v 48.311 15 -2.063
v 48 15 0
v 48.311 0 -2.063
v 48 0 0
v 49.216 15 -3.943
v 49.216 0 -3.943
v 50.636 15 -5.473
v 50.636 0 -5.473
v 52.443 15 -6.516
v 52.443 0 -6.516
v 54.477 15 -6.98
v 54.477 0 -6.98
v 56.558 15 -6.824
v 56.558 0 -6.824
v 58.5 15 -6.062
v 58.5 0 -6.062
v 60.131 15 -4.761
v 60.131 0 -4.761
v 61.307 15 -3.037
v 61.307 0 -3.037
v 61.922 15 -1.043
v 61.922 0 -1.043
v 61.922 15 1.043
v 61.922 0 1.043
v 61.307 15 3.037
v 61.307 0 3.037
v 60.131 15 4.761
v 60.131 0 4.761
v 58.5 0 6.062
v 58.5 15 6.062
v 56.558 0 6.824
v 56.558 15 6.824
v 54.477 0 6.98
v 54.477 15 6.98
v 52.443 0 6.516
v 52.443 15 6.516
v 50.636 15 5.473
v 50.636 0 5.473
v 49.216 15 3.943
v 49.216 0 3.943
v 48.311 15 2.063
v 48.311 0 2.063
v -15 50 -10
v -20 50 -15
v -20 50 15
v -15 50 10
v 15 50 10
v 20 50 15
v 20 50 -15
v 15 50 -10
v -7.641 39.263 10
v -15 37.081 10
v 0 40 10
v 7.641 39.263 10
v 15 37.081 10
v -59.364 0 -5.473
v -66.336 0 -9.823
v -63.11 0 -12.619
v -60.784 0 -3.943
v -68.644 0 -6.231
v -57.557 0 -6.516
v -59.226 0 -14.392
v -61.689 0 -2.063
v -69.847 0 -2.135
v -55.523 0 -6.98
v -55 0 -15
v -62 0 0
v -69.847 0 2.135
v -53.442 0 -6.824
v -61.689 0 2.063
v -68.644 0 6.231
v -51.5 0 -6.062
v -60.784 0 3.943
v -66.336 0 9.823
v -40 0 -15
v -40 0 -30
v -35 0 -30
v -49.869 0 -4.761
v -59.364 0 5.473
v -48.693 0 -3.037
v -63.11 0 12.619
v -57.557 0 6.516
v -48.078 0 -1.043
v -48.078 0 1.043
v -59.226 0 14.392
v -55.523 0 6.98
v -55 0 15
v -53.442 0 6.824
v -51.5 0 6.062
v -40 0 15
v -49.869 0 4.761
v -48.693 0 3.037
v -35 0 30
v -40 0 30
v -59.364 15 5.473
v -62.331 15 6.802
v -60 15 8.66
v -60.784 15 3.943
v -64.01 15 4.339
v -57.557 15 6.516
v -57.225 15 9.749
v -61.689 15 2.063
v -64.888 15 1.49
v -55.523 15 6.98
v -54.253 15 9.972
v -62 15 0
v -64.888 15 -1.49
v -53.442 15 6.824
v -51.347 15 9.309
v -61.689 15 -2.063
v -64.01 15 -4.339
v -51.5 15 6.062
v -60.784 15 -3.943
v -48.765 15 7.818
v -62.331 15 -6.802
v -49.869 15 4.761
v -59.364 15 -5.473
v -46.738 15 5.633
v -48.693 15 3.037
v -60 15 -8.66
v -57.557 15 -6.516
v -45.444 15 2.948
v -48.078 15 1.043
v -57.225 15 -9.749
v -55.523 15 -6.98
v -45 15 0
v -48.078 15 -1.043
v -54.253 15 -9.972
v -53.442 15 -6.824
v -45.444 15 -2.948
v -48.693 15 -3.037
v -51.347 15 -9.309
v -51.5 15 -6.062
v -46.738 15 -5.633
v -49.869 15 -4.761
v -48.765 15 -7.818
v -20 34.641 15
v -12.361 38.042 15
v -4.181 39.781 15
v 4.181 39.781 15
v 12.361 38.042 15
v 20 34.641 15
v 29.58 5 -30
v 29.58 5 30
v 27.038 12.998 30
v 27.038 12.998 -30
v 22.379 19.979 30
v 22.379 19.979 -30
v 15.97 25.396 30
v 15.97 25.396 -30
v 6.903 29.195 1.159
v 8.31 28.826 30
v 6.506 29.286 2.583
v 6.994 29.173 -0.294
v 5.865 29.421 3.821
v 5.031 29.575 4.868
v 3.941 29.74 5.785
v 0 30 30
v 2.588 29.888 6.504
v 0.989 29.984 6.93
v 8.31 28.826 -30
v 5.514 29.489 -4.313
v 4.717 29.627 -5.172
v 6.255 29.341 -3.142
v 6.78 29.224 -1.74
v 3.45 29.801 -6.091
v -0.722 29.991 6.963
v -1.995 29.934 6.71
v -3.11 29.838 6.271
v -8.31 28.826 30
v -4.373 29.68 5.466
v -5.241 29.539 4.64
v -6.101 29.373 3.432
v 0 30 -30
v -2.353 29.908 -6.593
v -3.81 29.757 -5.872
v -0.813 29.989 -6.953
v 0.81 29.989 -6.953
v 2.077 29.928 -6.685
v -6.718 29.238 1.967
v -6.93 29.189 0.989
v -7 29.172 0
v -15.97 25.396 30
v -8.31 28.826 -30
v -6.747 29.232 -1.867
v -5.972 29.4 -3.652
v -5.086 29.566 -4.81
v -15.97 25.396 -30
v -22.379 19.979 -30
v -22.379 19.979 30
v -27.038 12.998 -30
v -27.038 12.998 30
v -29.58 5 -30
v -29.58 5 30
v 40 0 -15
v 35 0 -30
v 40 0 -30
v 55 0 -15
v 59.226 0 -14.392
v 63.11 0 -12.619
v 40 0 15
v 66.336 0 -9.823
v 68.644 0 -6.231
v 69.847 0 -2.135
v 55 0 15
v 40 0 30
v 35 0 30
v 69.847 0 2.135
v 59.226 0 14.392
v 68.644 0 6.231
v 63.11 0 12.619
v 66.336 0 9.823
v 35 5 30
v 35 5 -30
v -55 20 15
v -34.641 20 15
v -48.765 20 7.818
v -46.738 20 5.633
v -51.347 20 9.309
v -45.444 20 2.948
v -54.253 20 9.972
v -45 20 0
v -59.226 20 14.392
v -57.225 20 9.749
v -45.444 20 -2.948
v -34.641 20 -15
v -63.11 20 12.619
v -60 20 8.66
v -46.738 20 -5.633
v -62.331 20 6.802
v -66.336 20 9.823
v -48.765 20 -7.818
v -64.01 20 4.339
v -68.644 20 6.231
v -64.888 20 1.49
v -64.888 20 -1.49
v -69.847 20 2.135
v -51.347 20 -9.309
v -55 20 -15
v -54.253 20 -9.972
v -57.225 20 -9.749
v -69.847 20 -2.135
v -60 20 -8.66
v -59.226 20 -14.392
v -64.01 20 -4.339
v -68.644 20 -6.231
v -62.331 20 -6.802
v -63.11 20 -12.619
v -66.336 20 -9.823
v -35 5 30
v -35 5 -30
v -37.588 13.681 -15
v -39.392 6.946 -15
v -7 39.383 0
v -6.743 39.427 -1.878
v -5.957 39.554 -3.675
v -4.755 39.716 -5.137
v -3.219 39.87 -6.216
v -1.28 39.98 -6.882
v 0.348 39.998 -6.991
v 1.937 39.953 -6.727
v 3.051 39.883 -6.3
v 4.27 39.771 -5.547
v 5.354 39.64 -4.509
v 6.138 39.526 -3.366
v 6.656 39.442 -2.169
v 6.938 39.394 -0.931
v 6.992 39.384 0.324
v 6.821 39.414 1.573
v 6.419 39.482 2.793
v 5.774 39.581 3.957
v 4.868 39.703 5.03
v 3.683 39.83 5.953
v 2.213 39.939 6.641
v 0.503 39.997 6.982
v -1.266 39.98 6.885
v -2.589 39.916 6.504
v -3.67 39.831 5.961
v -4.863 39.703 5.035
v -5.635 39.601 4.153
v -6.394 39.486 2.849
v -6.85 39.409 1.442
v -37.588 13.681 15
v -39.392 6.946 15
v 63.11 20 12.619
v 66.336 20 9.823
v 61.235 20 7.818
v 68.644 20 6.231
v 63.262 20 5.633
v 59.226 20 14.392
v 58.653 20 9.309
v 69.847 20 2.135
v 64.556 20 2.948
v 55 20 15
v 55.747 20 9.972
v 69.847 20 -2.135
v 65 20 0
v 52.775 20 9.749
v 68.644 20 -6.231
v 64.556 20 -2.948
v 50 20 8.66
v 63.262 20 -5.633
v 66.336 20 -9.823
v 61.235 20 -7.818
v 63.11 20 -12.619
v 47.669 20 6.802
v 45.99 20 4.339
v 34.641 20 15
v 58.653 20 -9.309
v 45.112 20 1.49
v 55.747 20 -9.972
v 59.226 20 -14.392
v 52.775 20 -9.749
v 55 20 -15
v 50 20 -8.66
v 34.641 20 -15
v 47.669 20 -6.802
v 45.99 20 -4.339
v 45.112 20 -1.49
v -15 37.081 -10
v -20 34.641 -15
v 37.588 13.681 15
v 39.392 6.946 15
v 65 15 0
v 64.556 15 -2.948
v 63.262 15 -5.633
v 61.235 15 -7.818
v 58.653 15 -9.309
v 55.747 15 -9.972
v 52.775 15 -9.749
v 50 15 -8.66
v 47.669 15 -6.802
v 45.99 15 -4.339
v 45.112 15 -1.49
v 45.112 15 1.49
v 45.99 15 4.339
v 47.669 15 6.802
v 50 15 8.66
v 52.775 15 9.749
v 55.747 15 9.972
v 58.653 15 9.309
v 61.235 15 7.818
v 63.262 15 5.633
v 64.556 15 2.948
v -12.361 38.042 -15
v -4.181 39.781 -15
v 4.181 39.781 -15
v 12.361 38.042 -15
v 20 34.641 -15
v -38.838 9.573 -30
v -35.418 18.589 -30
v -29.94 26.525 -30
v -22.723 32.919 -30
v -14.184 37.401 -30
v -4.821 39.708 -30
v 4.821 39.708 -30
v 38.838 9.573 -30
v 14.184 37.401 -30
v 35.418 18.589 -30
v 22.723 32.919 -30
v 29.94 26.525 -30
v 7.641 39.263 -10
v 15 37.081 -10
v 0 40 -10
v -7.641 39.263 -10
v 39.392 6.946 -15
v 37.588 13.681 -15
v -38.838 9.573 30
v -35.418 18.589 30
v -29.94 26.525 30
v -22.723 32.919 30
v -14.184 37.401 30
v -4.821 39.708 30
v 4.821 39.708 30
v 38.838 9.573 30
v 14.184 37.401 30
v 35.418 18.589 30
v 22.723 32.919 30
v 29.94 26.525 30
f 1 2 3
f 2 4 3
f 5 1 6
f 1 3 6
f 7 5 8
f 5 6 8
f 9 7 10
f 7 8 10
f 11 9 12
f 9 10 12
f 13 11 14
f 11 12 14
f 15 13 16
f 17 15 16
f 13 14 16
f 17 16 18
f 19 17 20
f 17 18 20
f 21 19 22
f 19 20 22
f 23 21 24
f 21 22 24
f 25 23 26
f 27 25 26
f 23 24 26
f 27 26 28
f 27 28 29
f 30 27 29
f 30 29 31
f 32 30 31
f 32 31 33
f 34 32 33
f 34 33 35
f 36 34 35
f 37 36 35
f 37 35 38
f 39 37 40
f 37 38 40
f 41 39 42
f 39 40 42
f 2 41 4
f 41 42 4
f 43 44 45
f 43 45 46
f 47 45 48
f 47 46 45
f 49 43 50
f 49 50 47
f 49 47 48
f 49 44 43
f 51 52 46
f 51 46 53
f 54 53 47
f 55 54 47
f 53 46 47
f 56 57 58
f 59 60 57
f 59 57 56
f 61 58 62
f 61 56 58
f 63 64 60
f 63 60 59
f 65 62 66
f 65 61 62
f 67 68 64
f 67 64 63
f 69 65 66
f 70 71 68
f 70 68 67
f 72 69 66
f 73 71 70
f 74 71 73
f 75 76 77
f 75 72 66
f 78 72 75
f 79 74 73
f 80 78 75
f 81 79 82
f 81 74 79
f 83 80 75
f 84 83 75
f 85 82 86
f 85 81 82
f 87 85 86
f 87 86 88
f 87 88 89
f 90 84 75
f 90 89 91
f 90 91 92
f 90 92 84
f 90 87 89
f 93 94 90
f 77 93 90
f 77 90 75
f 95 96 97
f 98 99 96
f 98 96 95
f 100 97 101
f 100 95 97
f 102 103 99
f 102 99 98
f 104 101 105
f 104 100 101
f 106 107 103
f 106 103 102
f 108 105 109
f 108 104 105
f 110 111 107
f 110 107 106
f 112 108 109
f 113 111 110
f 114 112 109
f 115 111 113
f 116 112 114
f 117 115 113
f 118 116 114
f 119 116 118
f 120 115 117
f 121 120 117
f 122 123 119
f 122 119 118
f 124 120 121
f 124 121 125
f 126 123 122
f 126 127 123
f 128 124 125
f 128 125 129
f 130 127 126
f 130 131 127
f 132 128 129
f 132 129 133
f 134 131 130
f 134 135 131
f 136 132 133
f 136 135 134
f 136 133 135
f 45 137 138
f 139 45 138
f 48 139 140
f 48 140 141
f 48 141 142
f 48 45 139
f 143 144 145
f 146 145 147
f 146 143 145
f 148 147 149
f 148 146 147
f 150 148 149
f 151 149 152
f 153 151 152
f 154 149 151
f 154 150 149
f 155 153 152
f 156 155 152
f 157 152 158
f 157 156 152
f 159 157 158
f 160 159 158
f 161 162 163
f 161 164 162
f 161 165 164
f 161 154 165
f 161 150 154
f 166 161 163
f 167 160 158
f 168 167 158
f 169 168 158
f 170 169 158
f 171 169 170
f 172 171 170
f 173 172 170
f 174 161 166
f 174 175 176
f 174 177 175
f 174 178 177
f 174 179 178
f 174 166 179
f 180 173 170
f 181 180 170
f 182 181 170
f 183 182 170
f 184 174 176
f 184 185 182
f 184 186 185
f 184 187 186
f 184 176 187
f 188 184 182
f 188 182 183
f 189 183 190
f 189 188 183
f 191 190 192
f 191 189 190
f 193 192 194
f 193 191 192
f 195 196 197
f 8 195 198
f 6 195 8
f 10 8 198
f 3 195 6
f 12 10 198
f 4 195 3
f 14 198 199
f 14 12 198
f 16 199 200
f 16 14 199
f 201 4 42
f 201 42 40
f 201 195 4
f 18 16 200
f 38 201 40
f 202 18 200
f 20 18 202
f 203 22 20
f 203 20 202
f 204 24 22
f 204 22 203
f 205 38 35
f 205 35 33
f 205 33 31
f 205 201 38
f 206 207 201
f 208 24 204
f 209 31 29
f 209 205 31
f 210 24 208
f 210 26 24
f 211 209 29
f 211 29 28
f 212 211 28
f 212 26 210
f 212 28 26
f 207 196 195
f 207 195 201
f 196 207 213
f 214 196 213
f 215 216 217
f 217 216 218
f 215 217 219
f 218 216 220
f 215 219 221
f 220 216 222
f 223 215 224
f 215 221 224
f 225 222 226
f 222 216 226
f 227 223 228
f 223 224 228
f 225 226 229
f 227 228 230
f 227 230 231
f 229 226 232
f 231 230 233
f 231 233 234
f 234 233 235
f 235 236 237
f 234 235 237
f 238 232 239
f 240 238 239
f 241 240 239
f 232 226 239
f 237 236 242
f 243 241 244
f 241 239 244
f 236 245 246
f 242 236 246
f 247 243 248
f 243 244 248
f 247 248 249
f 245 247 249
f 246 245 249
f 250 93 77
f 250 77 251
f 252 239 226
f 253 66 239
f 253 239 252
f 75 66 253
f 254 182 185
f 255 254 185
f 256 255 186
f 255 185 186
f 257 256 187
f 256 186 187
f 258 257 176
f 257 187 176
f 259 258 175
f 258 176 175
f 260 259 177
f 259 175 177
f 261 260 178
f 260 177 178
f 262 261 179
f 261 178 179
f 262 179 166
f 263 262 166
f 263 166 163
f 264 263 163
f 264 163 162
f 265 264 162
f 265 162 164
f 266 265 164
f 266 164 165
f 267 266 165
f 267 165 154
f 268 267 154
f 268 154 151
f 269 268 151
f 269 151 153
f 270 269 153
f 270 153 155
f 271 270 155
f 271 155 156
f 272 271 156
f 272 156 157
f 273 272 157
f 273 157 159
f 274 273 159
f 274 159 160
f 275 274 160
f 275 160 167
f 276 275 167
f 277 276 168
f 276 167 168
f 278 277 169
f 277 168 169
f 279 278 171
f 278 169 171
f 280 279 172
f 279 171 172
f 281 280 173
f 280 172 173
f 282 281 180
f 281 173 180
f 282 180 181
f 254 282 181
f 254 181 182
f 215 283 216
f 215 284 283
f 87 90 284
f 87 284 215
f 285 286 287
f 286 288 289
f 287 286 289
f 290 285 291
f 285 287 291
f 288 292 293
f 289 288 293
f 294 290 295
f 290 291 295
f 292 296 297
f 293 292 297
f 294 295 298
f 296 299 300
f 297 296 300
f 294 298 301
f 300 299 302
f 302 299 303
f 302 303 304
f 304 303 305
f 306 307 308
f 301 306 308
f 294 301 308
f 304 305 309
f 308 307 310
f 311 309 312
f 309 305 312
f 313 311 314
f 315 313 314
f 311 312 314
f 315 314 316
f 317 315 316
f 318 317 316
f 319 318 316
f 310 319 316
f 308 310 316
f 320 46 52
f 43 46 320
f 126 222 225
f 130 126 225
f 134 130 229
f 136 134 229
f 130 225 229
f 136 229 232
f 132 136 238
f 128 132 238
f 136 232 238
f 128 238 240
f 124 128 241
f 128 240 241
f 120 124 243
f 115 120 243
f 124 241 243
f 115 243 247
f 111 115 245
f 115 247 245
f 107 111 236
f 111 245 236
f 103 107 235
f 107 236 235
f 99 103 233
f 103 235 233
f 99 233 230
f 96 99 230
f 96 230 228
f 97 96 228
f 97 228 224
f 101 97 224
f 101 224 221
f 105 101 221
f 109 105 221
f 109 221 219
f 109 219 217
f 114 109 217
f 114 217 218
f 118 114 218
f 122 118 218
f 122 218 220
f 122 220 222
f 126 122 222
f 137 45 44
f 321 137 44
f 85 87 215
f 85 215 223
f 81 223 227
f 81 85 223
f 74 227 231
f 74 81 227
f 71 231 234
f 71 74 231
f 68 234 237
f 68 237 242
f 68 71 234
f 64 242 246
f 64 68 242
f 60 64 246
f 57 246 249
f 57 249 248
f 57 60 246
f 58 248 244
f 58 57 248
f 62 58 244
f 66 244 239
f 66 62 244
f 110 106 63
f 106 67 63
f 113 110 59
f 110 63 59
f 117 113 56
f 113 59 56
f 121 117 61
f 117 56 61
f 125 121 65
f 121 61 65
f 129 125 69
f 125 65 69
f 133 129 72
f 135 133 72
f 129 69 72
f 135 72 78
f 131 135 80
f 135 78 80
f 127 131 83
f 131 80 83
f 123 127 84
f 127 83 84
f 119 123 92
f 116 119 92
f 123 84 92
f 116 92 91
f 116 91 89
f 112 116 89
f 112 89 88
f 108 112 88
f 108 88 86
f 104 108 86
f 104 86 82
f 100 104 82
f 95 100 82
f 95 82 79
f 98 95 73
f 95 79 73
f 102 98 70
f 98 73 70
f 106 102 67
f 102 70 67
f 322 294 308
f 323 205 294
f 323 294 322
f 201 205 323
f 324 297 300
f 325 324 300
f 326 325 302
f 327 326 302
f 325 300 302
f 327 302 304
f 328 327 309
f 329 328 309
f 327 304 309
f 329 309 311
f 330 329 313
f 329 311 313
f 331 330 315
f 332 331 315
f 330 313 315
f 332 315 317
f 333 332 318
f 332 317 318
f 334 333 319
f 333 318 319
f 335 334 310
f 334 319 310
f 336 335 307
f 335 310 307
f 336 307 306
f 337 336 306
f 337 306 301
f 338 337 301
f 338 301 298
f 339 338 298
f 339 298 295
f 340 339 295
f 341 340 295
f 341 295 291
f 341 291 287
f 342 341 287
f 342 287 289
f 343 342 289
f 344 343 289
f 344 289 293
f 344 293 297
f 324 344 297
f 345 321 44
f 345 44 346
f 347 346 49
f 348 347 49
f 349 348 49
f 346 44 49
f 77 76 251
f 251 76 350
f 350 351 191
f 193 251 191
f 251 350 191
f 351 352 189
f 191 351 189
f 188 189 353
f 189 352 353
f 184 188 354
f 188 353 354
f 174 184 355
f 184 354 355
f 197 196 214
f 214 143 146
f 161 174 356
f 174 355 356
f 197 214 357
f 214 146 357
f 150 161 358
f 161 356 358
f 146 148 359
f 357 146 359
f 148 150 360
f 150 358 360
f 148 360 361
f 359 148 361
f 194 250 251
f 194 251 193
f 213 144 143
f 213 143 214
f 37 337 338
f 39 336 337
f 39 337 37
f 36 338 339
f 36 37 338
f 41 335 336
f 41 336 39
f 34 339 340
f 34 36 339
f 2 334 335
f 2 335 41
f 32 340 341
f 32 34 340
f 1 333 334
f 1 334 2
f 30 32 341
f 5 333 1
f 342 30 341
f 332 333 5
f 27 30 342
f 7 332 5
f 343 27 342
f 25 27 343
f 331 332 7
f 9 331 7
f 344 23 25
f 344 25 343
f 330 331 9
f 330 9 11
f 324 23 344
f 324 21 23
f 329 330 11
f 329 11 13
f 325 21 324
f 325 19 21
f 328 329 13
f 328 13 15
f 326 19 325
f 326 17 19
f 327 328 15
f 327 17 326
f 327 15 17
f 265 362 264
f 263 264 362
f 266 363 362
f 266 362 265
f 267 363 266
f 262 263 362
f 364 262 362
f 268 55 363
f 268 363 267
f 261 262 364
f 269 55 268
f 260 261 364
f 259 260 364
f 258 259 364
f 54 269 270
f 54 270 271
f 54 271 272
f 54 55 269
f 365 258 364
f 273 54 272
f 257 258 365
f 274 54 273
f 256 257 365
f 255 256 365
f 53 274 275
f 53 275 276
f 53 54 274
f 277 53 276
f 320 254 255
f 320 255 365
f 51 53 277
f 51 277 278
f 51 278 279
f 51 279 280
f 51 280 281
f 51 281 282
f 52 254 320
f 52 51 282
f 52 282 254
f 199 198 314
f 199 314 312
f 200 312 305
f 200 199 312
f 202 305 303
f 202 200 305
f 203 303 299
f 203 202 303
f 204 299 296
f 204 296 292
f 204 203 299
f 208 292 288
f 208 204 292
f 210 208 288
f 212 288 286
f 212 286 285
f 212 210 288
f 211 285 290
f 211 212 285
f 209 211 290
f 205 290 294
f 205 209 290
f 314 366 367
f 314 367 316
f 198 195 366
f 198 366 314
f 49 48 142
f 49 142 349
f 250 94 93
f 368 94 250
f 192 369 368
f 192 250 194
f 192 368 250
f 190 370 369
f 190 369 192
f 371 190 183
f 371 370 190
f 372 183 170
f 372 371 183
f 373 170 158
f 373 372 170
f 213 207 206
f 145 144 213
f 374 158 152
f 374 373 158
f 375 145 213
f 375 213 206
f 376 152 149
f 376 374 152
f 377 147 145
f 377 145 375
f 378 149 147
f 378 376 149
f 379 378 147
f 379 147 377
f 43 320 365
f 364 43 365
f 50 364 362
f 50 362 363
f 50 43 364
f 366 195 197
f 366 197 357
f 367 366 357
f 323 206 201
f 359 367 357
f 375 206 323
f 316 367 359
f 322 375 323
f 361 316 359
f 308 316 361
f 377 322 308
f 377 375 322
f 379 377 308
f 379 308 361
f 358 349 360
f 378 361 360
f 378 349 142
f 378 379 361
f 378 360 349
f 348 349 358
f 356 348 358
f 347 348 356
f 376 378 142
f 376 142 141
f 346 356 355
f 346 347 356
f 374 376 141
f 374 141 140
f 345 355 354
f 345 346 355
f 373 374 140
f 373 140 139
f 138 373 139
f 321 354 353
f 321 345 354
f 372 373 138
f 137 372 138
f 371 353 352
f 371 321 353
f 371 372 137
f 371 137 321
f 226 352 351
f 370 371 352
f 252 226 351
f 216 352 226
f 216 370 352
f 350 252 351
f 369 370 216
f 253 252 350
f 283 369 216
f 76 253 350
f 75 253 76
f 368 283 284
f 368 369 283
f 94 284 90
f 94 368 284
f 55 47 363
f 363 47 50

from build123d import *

# Parameters (mm, degrees)
BOSS_EXTRUDE1_DEPTH      = 20
BOSS_EXTRUDE2_DEPTH      = 30
BOSS_EXTRUDE3_REACH      = 93.104
BOSS_EXTRUDE3_END_RADIUS = 40
SKETCH3_W                = 40
SKETCH3_H                = 30
SKETCH3_W_2              = 30
SKETCH3_H_2              = 20
CUT_EXTRUDE1_DEPTH       = 105.880884817
CUT_EXTRUDE1_DEPTH_BACK  = 105.880884817
SKETCH5_W                = 70
SKETCH5_H                = 5
CUT_EXTRUDE2_DEPTH       = 105.880884817
HOLE1_D                  = 14
HOLE3_D                  = 14
HOLE3_DEPTH              = 20
HOLE3_CBORE_D            = 20
HOLE3_CBORE_DEPTH        = 5
HOLE3_TIP                = 4.206024333


with BuildPart() as part:
    # Sketch1 → Boss-Extrude1 (new body)
    with BuildSketch(Plane(origin=(0, 0, 0), x_dir=(1, 0, 0), z_dir=(0, 1, 0))):
        with BuildLine():
            Line((-55, 15), (55, 15))
            ThreePointArc((55, 15), (70, 0), (55, -15))
            Line((55, -15), (-55, -15))
            ThreePointArc((-55, -15), (-70, 0), (-55, 15))
        make_face()
    extrude(amount=BOSS_EXTRUDE1_DEPTH)

    # Sketch2 → Boss-Extrude2 (add, symmetric)
    with BuildSketch(Plane.XY):
        with BuildLine():
            Line((-40, 0), (40, 0))
            ThreePointArc((40, 0), (0, 40), (-40, 0))
        make_face()
    extrude(amount=BOSS_EXTRUDE2_DEPTH, both=True)

    # Boss-Extrude3: up to this cylinder (the profile starts outside it)
    boss_extrude3_end = Plane(origin=(0, 0, -14.5), z_dir=(0, 0, -1)) * Cylinder(BOSS_EXTRUDE3_END_RADIUS, 267.208, mode=Mode.PRIVATE)
    # Sketch3 → Boss-Extrude3 (add, up to the surface)
    with BuildSketch(Plane(origin=(0, 50, 0), x_dir=(1, 0, 0), z_dir=(0, 1, 0)), mode=Mode.PRIVATE) as boss_extrude3_sk1:
        Rectangle(SKETCH3_W, SKETCH3_H)
        Rectangle(SKETCH3_W_2, SKETCH3_H_2, mode=Mode.SUBTRACT)
    boss_extrude3_tool1 = extrude(boss_extrude3_sk1.sketch, amount=-BOSS_EXTRUDE3_REACH, mode=Mode.PRIVATE) - boss_extrude3_end
    add(boss_extrude3_tool1.solids().sort_by_distance((0, 50, -14.5))[0])

    # Sketch4 → Cut-Extrude1 (cut, two sides: drawn at the far end of the back side and taken through both)
    with BuildSketch(Plane.XY.offset(30).offset(-CUT_EXTRUDE1_DEPTH_BACK)):
        with BuildLine():
            Line((-30, 0), (30, 0))
            ThreePointArc((30, 0), (0, 30), (-30, 0))
        make_face()
    extrude(amount=CUT_EXTRUDE1_DEPTH + CUT_EXTRUDE1_DEPTH_BACK, mode=Mode.SUBTRACT)

    # Sketch5 → Cut-Extrude2 (cut, through all)
    with BuildSketch(Plane.XY.offset(30)):
        with Locations((0, 2.5)):
            Rectangle(SKETCH5_W, SKETCH5_H)
    extrude(amount=-CUT_EXTRUDE2_DEPTH, mode=Mode.SUBTRACT)

    # Hole1 (through all)
    with Locations(Plane(origin=(0, 50, 0), x_dir=(1, 0, 0), z_dir=(0, 1, 0))):
        with Locations((0, 0)):
            Hole(HOLE1_D / 2)

    # Hole3
    with Locations(Plane(origin=(0, 20, 0), x_dir=(1, 0, 0), z_dir=(0, 1, 0))):
        with Locations((-55, 0), (55, 0)):
            CounterBoreHole(HOLE3_D / 2, HOLE3_CBORE_D / 2, HOLE3_CBORE_DEPTH, depth=HOLE3_DEPTH)
            with Locations((0, 0, -(HOLE3_DEPTH + HOLE3_TIP / 2))):  # 118° drill point
                Cone(0, HOLE3_D / 2, HOLE3_TIP, mode=Mode.SUBTRACT)


solid = part.part
